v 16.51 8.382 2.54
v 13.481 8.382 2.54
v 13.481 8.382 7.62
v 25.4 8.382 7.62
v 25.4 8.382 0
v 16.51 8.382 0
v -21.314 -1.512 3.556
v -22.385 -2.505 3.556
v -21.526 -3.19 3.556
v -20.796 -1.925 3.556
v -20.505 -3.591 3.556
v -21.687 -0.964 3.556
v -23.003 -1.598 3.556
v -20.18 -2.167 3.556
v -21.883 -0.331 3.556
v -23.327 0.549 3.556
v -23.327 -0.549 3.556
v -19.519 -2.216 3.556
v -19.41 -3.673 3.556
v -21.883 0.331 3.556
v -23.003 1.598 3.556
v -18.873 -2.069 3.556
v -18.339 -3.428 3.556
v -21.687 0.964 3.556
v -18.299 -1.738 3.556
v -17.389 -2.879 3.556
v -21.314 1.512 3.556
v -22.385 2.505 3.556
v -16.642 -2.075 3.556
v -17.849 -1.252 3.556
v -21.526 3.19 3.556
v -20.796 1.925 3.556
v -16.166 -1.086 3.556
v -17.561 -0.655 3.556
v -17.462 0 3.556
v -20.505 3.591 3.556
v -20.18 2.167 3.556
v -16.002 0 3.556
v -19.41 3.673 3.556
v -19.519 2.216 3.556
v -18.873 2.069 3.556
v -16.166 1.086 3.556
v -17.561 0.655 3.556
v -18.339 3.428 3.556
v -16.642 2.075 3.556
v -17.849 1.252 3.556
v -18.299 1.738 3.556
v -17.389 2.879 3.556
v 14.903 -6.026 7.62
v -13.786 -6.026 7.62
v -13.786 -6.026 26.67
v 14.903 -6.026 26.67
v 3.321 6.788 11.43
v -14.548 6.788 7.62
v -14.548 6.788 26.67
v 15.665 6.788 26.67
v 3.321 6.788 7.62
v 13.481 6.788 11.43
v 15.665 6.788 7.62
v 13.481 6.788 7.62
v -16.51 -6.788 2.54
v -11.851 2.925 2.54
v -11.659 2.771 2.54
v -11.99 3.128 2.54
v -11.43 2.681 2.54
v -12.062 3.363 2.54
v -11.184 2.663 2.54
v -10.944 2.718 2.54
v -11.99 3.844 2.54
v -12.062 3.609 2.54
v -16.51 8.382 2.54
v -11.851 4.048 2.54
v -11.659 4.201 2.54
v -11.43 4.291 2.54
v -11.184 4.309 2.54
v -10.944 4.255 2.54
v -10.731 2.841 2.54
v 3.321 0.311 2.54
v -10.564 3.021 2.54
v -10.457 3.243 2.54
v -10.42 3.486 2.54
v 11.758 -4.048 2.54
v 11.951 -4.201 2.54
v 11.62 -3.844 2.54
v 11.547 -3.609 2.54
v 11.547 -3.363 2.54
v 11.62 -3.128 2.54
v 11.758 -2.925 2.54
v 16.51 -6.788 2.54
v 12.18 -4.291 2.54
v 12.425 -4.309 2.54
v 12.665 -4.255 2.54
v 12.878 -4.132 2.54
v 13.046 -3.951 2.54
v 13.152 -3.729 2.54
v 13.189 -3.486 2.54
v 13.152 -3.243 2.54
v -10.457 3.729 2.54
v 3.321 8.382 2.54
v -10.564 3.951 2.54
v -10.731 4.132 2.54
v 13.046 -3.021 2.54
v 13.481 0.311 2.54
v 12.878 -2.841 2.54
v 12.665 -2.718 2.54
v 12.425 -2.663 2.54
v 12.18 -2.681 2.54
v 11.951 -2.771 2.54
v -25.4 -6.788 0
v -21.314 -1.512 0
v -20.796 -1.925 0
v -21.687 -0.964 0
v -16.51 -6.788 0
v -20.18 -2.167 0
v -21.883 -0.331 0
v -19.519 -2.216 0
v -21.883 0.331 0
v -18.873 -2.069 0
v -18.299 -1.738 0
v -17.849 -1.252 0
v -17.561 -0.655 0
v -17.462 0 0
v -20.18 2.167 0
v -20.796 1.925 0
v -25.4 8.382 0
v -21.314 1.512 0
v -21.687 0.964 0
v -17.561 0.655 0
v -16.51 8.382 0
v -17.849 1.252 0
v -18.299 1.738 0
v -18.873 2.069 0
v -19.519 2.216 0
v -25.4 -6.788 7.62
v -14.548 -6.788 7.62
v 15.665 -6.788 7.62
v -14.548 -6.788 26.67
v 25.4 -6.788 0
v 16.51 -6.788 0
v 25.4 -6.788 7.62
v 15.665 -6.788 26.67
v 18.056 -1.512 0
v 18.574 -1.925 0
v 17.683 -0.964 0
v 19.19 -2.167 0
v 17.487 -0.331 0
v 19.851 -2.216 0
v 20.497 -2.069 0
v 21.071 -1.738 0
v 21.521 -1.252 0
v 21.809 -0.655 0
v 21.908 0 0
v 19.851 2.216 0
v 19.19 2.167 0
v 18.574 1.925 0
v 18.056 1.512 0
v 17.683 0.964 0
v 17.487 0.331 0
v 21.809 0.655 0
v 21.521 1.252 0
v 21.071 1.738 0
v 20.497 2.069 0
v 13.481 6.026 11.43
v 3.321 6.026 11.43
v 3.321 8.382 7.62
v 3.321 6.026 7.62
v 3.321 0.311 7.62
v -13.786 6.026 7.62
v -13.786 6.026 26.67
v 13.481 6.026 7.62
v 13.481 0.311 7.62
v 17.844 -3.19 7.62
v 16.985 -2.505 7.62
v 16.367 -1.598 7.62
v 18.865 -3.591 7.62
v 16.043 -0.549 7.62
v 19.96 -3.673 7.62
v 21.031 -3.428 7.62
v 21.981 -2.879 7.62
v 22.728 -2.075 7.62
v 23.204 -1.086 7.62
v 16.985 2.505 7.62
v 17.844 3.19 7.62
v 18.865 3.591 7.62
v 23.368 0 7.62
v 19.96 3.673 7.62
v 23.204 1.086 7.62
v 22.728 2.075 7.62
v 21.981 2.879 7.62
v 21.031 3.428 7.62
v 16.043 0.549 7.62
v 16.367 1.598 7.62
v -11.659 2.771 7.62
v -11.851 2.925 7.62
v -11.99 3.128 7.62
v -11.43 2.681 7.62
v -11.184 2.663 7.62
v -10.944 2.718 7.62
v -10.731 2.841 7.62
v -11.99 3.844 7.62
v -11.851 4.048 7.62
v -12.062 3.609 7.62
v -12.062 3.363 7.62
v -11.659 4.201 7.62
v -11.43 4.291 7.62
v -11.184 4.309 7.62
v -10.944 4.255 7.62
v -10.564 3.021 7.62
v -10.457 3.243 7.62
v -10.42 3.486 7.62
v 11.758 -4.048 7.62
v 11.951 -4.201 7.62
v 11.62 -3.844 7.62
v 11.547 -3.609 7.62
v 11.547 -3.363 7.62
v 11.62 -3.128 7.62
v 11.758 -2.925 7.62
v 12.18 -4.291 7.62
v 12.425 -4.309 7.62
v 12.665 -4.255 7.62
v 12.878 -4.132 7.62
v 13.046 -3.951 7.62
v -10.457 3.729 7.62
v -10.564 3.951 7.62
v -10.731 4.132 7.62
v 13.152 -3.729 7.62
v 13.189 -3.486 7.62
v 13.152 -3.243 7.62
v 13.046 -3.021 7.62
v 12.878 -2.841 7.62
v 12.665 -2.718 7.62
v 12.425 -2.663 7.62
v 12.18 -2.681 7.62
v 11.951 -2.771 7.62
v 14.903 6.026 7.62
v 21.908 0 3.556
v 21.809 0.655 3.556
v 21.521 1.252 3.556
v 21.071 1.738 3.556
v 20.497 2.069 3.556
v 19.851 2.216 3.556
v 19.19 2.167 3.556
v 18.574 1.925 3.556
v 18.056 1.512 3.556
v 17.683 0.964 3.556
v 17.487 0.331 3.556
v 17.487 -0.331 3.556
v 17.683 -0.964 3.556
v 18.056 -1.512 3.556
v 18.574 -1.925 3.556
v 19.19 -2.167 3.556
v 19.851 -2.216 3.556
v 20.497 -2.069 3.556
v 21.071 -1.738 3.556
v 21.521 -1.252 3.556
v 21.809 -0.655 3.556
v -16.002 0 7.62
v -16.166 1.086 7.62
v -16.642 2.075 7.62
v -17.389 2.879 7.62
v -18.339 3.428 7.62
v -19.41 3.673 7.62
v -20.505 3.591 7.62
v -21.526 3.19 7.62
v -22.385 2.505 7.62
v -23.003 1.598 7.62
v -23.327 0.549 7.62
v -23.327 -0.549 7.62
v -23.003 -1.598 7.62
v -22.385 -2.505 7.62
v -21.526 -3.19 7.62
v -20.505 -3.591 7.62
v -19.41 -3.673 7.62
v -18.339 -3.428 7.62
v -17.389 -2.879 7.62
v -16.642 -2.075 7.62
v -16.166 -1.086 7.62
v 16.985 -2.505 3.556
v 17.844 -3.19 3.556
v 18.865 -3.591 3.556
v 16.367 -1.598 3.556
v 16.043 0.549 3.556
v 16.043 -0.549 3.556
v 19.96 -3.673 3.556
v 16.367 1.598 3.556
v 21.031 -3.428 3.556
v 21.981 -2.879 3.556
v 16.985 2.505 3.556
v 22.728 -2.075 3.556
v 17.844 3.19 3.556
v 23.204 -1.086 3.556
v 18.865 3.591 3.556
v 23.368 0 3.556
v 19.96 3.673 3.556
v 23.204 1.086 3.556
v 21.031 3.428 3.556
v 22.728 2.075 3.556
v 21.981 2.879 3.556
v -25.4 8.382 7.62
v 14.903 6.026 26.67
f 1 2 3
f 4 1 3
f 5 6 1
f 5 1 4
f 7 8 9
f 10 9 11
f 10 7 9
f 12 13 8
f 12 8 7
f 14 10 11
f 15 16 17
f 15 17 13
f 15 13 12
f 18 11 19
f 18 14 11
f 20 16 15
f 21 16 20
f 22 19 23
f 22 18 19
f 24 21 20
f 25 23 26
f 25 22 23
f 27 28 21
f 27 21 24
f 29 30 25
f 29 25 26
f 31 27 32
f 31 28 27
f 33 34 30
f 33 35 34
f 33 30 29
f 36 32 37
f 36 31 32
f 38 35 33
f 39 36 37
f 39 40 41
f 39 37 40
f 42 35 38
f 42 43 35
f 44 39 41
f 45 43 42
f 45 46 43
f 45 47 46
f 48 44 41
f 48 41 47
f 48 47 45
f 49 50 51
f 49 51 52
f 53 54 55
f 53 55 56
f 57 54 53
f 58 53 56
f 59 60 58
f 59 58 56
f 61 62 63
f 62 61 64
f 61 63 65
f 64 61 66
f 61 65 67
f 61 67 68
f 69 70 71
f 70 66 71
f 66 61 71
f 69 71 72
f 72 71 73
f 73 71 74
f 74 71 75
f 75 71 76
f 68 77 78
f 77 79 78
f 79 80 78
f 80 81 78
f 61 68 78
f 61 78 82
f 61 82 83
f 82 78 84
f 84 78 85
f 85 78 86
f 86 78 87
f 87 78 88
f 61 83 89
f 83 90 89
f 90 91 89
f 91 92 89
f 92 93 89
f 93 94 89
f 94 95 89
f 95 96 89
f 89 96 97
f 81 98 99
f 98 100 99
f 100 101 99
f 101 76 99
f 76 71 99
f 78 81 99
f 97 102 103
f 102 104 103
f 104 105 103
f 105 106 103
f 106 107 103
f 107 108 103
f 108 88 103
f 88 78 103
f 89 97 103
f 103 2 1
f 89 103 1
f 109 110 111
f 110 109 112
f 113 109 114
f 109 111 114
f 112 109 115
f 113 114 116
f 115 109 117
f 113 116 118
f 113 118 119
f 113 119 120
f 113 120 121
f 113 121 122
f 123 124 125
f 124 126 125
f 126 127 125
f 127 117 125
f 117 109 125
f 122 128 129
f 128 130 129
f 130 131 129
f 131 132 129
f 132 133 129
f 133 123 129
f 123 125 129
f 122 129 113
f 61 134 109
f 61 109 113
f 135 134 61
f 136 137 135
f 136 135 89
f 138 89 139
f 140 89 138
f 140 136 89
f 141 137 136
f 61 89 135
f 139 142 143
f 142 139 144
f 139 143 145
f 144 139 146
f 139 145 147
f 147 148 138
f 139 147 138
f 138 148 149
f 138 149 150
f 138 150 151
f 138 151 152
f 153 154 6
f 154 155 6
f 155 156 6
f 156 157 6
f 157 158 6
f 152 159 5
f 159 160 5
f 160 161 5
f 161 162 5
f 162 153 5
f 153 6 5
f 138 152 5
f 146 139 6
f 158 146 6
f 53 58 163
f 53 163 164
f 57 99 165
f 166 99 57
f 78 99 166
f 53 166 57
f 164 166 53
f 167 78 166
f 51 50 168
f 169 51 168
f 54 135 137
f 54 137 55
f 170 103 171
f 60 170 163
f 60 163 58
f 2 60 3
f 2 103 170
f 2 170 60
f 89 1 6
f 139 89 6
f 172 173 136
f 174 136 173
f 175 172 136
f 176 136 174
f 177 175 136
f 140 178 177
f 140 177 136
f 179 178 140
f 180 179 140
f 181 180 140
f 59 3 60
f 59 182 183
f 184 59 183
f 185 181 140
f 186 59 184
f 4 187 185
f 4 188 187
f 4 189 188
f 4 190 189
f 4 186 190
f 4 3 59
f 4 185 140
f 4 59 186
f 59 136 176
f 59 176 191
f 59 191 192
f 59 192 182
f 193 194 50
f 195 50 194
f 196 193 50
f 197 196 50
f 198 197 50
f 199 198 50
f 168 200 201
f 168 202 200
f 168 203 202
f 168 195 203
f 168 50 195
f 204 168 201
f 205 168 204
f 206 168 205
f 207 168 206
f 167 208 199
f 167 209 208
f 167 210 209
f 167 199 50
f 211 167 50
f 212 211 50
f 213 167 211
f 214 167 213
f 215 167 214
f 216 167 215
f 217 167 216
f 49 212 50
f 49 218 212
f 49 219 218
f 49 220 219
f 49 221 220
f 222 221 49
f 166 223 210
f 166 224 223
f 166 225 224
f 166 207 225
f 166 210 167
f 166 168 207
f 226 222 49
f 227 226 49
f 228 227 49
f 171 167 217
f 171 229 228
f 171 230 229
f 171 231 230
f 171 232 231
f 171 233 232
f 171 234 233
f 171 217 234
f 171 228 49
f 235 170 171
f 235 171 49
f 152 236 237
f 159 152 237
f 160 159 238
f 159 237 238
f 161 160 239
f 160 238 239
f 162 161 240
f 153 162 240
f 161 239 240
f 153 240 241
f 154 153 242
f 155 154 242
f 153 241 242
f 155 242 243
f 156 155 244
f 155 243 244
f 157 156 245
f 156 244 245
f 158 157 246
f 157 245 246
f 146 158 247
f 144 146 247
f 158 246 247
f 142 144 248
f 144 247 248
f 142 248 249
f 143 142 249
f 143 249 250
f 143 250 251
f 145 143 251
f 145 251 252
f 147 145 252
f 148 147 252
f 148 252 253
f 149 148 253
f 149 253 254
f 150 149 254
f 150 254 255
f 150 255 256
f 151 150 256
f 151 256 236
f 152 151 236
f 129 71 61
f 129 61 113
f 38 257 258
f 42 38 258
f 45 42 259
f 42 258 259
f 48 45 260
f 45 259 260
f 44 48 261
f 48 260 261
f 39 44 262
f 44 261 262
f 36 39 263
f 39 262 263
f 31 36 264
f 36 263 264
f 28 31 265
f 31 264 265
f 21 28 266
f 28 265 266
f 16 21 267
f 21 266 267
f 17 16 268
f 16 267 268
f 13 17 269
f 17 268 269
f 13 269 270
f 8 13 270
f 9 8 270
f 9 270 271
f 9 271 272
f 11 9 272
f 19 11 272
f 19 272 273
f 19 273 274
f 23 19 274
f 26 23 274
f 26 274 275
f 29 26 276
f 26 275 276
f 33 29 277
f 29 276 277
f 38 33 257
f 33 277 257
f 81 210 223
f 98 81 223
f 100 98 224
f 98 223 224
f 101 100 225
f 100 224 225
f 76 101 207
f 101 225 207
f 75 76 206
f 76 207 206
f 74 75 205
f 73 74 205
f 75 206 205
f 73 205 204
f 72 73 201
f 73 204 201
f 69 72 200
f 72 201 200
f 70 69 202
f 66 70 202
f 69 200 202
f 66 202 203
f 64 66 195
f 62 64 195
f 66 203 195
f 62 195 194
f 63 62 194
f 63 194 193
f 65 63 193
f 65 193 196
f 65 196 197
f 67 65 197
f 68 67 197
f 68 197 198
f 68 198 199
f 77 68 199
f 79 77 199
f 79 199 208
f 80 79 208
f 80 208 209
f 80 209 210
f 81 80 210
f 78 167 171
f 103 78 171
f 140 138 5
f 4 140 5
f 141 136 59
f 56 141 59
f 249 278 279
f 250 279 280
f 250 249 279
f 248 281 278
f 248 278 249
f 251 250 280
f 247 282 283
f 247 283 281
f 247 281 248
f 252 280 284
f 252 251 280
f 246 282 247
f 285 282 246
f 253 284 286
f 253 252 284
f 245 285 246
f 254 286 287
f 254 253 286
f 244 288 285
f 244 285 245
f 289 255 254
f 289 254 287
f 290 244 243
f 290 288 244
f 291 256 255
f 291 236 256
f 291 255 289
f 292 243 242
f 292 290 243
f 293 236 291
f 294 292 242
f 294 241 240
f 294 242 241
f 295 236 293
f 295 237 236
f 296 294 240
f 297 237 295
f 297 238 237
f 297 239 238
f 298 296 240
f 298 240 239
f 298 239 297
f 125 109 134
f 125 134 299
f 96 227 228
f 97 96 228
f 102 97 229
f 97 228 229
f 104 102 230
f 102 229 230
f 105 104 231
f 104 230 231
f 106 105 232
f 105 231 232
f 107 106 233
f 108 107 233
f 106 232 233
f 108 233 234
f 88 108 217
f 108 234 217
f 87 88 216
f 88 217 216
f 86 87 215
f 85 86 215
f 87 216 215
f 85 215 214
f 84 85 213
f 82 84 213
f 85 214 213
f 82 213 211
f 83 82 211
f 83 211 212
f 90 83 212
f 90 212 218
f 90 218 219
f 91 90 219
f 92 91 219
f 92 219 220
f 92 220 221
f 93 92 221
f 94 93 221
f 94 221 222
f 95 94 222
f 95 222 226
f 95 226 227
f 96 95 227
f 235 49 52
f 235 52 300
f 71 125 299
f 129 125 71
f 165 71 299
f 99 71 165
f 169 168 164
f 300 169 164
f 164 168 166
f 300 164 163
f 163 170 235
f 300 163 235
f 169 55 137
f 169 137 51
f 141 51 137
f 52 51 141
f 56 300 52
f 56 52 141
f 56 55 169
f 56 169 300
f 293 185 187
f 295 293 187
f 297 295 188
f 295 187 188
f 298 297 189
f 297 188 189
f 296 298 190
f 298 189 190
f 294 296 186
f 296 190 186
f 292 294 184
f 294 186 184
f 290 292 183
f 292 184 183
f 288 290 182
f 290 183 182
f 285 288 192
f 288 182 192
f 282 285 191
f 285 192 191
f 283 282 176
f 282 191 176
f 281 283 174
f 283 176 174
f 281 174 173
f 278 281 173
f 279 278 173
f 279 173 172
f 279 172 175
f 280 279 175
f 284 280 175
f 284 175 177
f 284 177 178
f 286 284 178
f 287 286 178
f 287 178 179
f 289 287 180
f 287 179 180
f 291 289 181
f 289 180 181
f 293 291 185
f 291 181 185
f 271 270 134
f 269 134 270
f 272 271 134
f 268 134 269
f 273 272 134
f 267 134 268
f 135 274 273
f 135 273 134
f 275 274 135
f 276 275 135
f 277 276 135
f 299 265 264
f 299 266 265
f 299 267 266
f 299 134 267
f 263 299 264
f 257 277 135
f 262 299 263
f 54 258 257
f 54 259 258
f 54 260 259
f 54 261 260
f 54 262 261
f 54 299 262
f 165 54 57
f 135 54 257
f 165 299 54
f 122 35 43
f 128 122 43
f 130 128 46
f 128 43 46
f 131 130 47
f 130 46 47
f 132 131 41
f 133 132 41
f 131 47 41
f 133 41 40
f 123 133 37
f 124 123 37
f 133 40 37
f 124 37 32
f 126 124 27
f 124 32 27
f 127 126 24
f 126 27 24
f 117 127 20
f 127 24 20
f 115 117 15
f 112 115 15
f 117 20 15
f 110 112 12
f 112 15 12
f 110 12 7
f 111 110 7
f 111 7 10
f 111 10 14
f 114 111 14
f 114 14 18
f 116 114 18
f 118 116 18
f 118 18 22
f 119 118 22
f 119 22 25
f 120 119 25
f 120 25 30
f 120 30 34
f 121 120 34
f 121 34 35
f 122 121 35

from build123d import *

# Parameters (mm, degrees)
SKETCH4_W               = 50.8
SKETCH4_H               = 16.764
BOSS_EXTRUDE1_DEPTH     = 7.62
SKETCH5_R               = 0.8255
SKETCH5_W               = 10.16
SKETCH5_H               = 5.08
CUT_EXTRUDE1_DEPTH      = 7.62
SKETCH6_R               = 3.683
SKETCH6_R_2             = 2.2225
CUT_EXTRUDE2_DEPTH      = 4.064
SKETCH6_2_R             = 2.2225
CUT_EXTRUDE3_DEPTH      = 7.62
SKETCH7_W               = 33.02
SKETCH7_H               = 5.08
CUT_EXTRUDE4_DEPTH      = 1
CUT_EXTRUDE4_DEPTH_BACK = 17.764
SKETCH8_W               = 10.16
SKETCH8_H               = 2.54
CUT_EXTRUDE5_DEPTH      = 4.064
SKETCH9_W               = 30.2133
SKETCH9_H               = 13.5763
SKETCH9_W_2             = 28.6893
SKETCH9_H_2             = 12.0523
BOSS_EXTRUDE4_DEPTH     = 19.05
SKETCH12_W              = 10.16
SKETCH12_H              = 2.99085
CUT_EXTRUDE6_DEPTH      = 6.35
SKETCH13_W              = 50.8
SKETCH13_H              = 1.59385
CUT_EXTRUDE7_DEPTH      = 20.05
CUT_EXTRUDE7_DEPTH_BACK = 8.62


with BuildPart() as part:
    # Sketch4 → Boss-Extrude1 (new body)
    with BuildSketch(Plane.XY):
        Rectangle(SKETCH4_W, SKETCH4_H)
    extrude(amount=BOSS_EXTRUDE1_DEPTH)

    # Sketch5 → Cut-Extrude1 (cut)
    with BuildSketch(Plane.XY.offset(7.62)):
        with Locations((-11.24585, 3.48615)):
            Circle(SKETCH5_R)
        with Locations((12.36345, -3.48615)):
            Circle(SKETCH5_R)
        with Locations((8.40105, 2.85115)):
            Rectangle(SKETCH5_W, SKETCH5_H)
    extrude(amount=-CUT_EXTRUDE1_DEPTH, mode=Mode.SUBTRACT)

    # Sketch6 → Cut-Extrude2 (cut)
    with BuildSketch(Plane.XY.offset(7.62)):
        with Locations((-19.685, 0)):
            Circle(SKETCH6_R)
        with Locations((-19.685, 0)):
            Circle(SKETCH6_R_2, mode=Mode.SUBTRACT)
        with Locations((19.685, 0)):
            Circle(SKETCH6_R)
        with Locations((19.685, 0)):
            Circle(SKETCH6_R_2, mode=Mode.SUBTRACT)
    extrude(amount=-CUT_EXTRUDE2_DEPTH, mode=Mode.SUBTRACT)

    # Sketch6_2 → Cut-Extrude3 (cut)
    with BuildSketch(Plane.XY.offset(7.62)):
        with Locations((-19.685, 0)):
            Circle(SKETCH6_2_R)
        with Locations((19.685, 0)):
            Circle(SKETCH6_2_R)
    extrude(amount=-CUT_EXTRUDE3_DEPTH, mode=Mode.SUBTRACT)

    # Sketch7 → Cut-Extrude4 (cut, two sides)
    with BuildSketch(Plane(origin=(0, 8.382, 0), x_dir=(1, 0, 0), z_dir=(0, 1, 0))) as cut_extrude4_sk:
        Rectangle(SKETCH7_W, SKETCH7_H)
    extrude(amount=CUT_EXTRUDE4_DEPTH, mode=Mode.SUBTRACT)
    extrude(cut_extrude4_sk.sketch, amount=-CUT_EXTRUDE4_DEPTH_BACK, mode=Mode.SUBTRACT)

    # Sketch8 → Cut-Extrude5 (cut)
    with BuildSketch(Plane.XZ.offset(-5.39115)):
        with Locations((8.40105, 3.81)):
            Rectangle(SKETCH8_W, SKETCH8_H)
    extrude(amount=-CUT_EXTRUDE5_DEPTH, mode=Mode.SUBTRACT)

    # Sketch9 → Boss-Extrude4 (add)
    with BuildSketch(Plane.XY.offset(7.62)):
        with Locations((0.5588, 0)):
            Rectangle(SKETCH9_W, SKETCH9_H)
        with Locations((0.5588, 0)):
            Rectangle(SKETCH9_W_2, SKETCH9_H_2, mode=Mode.SUBTRACT)
    extrude(amount=BOSS_EXTRUDE4_DEPTH)

    # Sketch12 → Cut-Extrude6 (cut)
    with BuildSketch(Plane(origin=(0, 0, 5.08), x_dir=(-1, 0, 0), z_dir=(0, 0, -1))):
        with Locations((-8.40105, 6.886575)):
            Rectangle(SKETCH12_W, SKETCH12_H)
    extrude(amount=-CUT_EXTRUDE6_DEPTH, mode=Mode.SUBTRACT)

    # Sketch13 → Cut-Extrude7 (cut, two sides)
    with BuildSketch(Plane.XY.offset(7.62)) as cut_extrude7_sk:
        with Locations((0, -7.585075)):
            Rectangle(SKETCH13_W, SKETCH13_H)
    extrude(amount=CUT_EXTRUDE7_DEPTH, mode=Mode.SUBTRACT)
    extrude(cut_extrude7_sk.sketch, amount=-CUT_EXTRUDE7_DEPTH_BACK, mode=Mode.SUBTRACT)


solid = part.part
